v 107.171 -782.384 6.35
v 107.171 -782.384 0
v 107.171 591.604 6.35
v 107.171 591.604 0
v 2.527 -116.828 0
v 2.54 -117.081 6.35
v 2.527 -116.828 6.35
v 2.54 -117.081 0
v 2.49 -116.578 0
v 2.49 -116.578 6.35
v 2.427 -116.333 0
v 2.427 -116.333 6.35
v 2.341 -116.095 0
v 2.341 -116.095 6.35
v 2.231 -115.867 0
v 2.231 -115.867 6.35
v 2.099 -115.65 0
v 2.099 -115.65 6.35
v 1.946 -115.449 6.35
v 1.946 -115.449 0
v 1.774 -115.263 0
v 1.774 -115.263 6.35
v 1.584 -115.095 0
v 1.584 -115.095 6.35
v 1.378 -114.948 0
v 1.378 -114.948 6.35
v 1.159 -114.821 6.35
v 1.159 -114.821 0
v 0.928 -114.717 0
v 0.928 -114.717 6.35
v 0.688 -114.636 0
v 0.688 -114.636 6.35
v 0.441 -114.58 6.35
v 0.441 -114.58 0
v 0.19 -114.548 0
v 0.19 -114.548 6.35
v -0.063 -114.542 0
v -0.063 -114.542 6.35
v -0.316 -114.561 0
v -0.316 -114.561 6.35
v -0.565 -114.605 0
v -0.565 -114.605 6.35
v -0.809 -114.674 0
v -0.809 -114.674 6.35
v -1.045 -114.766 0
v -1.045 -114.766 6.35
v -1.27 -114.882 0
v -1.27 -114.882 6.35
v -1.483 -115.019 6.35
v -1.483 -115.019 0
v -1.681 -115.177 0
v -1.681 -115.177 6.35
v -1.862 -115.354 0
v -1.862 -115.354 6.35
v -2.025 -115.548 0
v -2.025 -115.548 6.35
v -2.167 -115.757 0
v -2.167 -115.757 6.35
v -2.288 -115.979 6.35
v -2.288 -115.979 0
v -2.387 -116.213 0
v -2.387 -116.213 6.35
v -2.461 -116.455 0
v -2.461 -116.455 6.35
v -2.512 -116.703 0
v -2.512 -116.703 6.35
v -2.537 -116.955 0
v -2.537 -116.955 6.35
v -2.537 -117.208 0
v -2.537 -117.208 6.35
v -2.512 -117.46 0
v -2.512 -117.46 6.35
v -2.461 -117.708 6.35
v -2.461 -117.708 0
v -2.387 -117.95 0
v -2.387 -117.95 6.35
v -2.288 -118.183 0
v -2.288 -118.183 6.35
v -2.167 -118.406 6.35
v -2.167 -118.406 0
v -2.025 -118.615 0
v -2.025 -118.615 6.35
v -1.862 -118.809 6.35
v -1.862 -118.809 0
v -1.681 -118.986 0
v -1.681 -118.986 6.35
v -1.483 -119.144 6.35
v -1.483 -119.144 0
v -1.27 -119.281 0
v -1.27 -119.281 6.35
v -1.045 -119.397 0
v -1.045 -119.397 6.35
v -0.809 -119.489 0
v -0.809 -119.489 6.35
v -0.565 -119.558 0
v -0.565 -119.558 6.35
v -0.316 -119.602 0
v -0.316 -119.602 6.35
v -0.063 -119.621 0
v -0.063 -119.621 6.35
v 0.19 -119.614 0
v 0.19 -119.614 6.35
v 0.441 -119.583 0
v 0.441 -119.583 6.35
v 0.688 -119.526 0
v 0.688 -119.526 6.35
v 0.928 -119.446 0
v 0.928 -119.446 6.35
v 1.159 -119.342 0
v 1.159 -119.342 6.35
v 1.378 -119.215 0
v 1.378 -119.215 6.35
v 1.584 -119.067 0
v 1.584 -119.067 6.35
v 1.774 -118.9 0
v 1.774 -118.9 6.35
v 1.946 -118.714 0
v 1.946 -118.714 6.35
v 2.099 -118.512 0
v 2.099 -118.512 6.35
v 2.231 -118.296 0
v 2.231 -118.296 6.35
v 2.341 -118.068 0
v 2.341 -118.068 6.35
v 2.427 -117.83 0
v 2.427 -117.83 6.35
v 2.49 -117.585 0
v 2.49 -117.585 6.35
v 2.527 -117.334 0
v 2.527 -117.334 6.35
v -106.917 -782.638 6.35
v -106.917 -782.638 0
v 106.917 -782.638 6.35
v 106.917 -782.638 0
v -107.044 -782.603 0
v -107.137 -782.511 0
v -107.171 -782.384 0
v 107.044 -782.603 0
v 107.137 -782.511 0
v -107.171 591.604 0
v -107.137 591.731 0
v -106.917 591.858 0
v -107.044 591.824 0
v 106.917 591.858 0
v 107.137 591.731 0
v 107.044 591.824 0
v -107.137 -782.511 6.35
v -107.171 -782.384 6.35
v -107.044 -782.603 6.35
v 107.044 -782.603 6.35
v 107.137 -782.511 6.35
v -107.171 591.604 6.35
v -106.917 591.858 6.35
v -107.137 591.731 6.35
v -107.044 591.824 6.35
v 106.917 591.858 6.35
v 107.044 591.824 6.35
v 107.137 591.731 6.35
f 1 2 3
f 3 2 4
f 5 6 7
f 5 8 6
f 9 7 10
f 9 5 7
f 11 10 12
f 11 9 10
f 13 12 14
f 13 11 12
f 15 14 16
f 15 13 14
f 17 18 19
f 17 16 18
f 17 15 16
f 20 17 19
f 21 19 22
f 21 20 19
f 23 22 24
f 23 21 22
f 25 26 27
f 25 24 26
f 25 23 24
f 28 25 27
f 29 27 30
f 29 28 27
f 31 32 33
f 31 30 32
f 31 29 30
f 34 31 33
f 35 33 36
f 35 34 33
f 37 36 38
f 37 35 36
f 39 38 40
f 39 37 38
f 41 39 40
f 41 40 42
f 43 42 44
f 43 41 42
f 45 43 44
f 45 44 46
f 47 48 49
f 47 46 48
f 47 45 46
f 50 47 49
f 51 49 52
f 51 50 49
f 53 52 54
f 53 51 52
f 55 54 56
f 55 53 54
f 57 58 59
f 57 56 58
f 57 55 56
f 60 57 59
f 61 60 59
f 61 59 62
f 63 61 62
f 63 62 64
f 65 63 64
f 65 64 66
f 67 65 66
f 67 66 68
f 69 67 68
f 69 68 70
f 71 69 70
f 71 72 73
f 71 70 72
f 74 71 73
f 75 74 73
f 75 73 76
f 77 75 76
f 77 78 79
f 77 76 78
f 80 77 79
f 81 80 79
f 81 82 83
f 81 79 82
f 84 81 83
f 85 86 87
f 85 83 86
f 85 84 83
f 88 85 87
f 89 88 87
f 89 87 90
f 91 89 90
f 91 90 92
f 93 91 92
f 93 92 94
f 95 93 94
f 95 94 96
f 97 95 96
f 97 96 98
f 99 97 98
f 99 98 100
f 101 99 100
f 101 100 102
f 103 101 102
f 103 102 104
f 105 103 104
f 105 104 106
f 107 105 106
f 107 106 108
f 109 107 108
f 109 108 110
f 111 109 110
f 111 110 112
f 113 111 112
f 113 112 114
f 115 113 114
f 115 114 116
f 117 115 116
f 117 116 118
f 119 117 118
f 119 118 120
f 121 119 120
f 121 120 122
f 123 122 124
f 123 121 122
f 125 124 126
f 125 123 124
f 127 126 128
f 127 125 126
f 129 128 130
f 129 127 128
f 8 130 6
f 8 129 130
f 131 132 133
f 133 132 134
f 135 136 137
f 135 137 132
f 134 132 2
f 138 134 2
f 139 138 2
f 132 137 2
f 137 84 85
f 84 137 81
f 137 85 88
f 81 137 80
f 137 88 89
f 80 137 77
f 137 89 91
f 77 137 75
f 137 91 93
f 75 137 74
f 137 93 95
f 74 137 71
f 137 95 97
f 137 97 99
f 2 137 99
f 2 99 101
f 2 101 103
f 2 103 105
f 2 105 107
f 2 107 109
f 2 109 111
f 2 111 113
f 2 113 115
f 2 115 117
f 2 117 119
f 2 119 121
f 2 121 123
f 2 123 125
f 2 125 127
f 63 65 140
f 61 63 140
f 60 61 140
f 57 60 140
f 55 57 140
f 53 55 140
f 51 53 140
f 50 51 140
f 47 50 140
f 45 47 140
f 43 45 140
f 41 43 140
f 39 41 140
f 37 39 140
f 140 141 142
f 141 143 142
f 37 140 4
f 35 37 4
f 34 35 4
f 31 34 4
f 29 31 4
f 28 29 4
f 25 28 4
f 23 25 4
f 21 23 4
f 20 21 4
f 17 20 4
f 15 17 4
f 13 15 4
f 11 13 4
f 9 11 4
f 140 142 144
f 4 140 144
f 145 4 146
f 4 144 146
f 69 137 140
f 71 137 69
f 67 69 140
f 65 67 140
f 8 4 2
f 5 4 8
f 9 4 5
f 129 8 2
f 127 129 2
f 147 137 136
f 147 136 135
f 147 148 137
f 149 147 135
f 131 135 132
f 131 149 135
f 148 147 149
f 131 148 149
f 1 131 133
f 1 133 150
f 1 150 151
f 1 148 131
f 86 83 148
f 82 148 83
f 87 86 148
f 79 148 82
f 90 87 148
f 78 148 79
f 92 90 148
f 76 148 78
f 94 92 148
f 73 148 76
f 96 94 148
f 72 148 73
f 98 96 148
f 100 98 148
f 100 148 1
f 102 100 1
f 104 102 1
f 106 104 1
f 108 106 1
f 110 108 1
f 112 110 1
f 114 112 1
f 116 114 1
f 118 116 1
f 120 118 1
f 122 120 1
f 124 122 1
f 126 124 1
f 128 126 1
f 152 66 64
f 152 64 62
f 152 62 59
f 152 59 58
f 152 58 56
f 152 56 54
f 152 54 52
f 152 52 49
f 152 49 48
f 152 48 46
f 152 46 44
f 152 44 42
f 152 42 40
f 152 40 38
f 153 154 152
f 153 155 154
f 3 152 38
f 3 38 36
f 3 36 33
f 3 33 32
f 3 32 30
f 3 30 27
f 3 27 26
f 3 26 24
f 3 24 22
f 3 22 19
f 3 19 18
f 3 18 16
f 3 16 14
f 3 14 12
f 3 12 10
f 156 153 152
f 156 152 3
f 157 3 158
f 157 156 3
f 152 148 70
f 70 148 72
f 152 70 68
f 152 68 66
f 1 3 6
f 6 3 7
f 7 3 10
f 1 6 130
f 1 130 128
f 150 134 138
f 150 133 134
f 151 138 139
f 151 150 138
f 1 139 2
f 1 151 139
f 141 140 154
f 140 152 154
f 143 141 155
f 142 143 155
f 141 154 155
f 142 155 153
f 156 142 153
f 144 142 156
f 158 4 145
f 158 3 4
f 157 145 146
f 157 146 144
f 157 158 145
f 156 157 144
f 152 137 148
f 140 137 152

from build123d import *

# Parameters (mm, degrees)
SKETCH1_W               = 214.341591878
SKETCH1_H               = 1374.4956
BOSS_EXTRUDE1_DEPTH     = 6.35
FILLET1_R               = 0.254
CUT_EXTRUDE1_DEPTH      = 790.966681834
CUT_EXTRUDE1_DEPTH_BACK = 790.966681834
SKETCH2_R               = 2.54


with BuildPart() as part:
    # Sketch1 → Boss-Extrude1 (new body)
    with BuildSketch(Plane.XY):
        with Locations((0, -95.3897)):
            Rectangle(SKETCH1_W, SKETCH1_H)
    extrude(amount=BOSS_EXTRUDE1_DEPTH)

    # Fillet1
    fillet1_edges = [part.edges().sort_by_distance(p)[0] for p in [
        (-107.170795939, 591.8581, 3.175),
        (107.170795939, 591.8581, 3.175),
        (107.170795939, -782.6375, 3.175),
        (-107.170795939, -782.6375, 3.175),
    ]]
    fillet(fillet1_edges, radius=FILLET1_R)

    # Sketch2 → Cut-Extrude1 (cut, two sides: drawn at the far end of the back side and taken through both)
    with BuildSketch(Plane.XY.offset(6.35).offset(-CUT_EXTRUDE1_DEPTH_BACK)):
        with Locations((0, -117.0813)):
            Circle(SKETCH2_R)
    extrude(amount=CUT_EXTRUDE1_DEPTH + CUT_EXTRUDE1_DEPTH_BACK, mode=Mode.SUBTRACT)


solid = part.part
